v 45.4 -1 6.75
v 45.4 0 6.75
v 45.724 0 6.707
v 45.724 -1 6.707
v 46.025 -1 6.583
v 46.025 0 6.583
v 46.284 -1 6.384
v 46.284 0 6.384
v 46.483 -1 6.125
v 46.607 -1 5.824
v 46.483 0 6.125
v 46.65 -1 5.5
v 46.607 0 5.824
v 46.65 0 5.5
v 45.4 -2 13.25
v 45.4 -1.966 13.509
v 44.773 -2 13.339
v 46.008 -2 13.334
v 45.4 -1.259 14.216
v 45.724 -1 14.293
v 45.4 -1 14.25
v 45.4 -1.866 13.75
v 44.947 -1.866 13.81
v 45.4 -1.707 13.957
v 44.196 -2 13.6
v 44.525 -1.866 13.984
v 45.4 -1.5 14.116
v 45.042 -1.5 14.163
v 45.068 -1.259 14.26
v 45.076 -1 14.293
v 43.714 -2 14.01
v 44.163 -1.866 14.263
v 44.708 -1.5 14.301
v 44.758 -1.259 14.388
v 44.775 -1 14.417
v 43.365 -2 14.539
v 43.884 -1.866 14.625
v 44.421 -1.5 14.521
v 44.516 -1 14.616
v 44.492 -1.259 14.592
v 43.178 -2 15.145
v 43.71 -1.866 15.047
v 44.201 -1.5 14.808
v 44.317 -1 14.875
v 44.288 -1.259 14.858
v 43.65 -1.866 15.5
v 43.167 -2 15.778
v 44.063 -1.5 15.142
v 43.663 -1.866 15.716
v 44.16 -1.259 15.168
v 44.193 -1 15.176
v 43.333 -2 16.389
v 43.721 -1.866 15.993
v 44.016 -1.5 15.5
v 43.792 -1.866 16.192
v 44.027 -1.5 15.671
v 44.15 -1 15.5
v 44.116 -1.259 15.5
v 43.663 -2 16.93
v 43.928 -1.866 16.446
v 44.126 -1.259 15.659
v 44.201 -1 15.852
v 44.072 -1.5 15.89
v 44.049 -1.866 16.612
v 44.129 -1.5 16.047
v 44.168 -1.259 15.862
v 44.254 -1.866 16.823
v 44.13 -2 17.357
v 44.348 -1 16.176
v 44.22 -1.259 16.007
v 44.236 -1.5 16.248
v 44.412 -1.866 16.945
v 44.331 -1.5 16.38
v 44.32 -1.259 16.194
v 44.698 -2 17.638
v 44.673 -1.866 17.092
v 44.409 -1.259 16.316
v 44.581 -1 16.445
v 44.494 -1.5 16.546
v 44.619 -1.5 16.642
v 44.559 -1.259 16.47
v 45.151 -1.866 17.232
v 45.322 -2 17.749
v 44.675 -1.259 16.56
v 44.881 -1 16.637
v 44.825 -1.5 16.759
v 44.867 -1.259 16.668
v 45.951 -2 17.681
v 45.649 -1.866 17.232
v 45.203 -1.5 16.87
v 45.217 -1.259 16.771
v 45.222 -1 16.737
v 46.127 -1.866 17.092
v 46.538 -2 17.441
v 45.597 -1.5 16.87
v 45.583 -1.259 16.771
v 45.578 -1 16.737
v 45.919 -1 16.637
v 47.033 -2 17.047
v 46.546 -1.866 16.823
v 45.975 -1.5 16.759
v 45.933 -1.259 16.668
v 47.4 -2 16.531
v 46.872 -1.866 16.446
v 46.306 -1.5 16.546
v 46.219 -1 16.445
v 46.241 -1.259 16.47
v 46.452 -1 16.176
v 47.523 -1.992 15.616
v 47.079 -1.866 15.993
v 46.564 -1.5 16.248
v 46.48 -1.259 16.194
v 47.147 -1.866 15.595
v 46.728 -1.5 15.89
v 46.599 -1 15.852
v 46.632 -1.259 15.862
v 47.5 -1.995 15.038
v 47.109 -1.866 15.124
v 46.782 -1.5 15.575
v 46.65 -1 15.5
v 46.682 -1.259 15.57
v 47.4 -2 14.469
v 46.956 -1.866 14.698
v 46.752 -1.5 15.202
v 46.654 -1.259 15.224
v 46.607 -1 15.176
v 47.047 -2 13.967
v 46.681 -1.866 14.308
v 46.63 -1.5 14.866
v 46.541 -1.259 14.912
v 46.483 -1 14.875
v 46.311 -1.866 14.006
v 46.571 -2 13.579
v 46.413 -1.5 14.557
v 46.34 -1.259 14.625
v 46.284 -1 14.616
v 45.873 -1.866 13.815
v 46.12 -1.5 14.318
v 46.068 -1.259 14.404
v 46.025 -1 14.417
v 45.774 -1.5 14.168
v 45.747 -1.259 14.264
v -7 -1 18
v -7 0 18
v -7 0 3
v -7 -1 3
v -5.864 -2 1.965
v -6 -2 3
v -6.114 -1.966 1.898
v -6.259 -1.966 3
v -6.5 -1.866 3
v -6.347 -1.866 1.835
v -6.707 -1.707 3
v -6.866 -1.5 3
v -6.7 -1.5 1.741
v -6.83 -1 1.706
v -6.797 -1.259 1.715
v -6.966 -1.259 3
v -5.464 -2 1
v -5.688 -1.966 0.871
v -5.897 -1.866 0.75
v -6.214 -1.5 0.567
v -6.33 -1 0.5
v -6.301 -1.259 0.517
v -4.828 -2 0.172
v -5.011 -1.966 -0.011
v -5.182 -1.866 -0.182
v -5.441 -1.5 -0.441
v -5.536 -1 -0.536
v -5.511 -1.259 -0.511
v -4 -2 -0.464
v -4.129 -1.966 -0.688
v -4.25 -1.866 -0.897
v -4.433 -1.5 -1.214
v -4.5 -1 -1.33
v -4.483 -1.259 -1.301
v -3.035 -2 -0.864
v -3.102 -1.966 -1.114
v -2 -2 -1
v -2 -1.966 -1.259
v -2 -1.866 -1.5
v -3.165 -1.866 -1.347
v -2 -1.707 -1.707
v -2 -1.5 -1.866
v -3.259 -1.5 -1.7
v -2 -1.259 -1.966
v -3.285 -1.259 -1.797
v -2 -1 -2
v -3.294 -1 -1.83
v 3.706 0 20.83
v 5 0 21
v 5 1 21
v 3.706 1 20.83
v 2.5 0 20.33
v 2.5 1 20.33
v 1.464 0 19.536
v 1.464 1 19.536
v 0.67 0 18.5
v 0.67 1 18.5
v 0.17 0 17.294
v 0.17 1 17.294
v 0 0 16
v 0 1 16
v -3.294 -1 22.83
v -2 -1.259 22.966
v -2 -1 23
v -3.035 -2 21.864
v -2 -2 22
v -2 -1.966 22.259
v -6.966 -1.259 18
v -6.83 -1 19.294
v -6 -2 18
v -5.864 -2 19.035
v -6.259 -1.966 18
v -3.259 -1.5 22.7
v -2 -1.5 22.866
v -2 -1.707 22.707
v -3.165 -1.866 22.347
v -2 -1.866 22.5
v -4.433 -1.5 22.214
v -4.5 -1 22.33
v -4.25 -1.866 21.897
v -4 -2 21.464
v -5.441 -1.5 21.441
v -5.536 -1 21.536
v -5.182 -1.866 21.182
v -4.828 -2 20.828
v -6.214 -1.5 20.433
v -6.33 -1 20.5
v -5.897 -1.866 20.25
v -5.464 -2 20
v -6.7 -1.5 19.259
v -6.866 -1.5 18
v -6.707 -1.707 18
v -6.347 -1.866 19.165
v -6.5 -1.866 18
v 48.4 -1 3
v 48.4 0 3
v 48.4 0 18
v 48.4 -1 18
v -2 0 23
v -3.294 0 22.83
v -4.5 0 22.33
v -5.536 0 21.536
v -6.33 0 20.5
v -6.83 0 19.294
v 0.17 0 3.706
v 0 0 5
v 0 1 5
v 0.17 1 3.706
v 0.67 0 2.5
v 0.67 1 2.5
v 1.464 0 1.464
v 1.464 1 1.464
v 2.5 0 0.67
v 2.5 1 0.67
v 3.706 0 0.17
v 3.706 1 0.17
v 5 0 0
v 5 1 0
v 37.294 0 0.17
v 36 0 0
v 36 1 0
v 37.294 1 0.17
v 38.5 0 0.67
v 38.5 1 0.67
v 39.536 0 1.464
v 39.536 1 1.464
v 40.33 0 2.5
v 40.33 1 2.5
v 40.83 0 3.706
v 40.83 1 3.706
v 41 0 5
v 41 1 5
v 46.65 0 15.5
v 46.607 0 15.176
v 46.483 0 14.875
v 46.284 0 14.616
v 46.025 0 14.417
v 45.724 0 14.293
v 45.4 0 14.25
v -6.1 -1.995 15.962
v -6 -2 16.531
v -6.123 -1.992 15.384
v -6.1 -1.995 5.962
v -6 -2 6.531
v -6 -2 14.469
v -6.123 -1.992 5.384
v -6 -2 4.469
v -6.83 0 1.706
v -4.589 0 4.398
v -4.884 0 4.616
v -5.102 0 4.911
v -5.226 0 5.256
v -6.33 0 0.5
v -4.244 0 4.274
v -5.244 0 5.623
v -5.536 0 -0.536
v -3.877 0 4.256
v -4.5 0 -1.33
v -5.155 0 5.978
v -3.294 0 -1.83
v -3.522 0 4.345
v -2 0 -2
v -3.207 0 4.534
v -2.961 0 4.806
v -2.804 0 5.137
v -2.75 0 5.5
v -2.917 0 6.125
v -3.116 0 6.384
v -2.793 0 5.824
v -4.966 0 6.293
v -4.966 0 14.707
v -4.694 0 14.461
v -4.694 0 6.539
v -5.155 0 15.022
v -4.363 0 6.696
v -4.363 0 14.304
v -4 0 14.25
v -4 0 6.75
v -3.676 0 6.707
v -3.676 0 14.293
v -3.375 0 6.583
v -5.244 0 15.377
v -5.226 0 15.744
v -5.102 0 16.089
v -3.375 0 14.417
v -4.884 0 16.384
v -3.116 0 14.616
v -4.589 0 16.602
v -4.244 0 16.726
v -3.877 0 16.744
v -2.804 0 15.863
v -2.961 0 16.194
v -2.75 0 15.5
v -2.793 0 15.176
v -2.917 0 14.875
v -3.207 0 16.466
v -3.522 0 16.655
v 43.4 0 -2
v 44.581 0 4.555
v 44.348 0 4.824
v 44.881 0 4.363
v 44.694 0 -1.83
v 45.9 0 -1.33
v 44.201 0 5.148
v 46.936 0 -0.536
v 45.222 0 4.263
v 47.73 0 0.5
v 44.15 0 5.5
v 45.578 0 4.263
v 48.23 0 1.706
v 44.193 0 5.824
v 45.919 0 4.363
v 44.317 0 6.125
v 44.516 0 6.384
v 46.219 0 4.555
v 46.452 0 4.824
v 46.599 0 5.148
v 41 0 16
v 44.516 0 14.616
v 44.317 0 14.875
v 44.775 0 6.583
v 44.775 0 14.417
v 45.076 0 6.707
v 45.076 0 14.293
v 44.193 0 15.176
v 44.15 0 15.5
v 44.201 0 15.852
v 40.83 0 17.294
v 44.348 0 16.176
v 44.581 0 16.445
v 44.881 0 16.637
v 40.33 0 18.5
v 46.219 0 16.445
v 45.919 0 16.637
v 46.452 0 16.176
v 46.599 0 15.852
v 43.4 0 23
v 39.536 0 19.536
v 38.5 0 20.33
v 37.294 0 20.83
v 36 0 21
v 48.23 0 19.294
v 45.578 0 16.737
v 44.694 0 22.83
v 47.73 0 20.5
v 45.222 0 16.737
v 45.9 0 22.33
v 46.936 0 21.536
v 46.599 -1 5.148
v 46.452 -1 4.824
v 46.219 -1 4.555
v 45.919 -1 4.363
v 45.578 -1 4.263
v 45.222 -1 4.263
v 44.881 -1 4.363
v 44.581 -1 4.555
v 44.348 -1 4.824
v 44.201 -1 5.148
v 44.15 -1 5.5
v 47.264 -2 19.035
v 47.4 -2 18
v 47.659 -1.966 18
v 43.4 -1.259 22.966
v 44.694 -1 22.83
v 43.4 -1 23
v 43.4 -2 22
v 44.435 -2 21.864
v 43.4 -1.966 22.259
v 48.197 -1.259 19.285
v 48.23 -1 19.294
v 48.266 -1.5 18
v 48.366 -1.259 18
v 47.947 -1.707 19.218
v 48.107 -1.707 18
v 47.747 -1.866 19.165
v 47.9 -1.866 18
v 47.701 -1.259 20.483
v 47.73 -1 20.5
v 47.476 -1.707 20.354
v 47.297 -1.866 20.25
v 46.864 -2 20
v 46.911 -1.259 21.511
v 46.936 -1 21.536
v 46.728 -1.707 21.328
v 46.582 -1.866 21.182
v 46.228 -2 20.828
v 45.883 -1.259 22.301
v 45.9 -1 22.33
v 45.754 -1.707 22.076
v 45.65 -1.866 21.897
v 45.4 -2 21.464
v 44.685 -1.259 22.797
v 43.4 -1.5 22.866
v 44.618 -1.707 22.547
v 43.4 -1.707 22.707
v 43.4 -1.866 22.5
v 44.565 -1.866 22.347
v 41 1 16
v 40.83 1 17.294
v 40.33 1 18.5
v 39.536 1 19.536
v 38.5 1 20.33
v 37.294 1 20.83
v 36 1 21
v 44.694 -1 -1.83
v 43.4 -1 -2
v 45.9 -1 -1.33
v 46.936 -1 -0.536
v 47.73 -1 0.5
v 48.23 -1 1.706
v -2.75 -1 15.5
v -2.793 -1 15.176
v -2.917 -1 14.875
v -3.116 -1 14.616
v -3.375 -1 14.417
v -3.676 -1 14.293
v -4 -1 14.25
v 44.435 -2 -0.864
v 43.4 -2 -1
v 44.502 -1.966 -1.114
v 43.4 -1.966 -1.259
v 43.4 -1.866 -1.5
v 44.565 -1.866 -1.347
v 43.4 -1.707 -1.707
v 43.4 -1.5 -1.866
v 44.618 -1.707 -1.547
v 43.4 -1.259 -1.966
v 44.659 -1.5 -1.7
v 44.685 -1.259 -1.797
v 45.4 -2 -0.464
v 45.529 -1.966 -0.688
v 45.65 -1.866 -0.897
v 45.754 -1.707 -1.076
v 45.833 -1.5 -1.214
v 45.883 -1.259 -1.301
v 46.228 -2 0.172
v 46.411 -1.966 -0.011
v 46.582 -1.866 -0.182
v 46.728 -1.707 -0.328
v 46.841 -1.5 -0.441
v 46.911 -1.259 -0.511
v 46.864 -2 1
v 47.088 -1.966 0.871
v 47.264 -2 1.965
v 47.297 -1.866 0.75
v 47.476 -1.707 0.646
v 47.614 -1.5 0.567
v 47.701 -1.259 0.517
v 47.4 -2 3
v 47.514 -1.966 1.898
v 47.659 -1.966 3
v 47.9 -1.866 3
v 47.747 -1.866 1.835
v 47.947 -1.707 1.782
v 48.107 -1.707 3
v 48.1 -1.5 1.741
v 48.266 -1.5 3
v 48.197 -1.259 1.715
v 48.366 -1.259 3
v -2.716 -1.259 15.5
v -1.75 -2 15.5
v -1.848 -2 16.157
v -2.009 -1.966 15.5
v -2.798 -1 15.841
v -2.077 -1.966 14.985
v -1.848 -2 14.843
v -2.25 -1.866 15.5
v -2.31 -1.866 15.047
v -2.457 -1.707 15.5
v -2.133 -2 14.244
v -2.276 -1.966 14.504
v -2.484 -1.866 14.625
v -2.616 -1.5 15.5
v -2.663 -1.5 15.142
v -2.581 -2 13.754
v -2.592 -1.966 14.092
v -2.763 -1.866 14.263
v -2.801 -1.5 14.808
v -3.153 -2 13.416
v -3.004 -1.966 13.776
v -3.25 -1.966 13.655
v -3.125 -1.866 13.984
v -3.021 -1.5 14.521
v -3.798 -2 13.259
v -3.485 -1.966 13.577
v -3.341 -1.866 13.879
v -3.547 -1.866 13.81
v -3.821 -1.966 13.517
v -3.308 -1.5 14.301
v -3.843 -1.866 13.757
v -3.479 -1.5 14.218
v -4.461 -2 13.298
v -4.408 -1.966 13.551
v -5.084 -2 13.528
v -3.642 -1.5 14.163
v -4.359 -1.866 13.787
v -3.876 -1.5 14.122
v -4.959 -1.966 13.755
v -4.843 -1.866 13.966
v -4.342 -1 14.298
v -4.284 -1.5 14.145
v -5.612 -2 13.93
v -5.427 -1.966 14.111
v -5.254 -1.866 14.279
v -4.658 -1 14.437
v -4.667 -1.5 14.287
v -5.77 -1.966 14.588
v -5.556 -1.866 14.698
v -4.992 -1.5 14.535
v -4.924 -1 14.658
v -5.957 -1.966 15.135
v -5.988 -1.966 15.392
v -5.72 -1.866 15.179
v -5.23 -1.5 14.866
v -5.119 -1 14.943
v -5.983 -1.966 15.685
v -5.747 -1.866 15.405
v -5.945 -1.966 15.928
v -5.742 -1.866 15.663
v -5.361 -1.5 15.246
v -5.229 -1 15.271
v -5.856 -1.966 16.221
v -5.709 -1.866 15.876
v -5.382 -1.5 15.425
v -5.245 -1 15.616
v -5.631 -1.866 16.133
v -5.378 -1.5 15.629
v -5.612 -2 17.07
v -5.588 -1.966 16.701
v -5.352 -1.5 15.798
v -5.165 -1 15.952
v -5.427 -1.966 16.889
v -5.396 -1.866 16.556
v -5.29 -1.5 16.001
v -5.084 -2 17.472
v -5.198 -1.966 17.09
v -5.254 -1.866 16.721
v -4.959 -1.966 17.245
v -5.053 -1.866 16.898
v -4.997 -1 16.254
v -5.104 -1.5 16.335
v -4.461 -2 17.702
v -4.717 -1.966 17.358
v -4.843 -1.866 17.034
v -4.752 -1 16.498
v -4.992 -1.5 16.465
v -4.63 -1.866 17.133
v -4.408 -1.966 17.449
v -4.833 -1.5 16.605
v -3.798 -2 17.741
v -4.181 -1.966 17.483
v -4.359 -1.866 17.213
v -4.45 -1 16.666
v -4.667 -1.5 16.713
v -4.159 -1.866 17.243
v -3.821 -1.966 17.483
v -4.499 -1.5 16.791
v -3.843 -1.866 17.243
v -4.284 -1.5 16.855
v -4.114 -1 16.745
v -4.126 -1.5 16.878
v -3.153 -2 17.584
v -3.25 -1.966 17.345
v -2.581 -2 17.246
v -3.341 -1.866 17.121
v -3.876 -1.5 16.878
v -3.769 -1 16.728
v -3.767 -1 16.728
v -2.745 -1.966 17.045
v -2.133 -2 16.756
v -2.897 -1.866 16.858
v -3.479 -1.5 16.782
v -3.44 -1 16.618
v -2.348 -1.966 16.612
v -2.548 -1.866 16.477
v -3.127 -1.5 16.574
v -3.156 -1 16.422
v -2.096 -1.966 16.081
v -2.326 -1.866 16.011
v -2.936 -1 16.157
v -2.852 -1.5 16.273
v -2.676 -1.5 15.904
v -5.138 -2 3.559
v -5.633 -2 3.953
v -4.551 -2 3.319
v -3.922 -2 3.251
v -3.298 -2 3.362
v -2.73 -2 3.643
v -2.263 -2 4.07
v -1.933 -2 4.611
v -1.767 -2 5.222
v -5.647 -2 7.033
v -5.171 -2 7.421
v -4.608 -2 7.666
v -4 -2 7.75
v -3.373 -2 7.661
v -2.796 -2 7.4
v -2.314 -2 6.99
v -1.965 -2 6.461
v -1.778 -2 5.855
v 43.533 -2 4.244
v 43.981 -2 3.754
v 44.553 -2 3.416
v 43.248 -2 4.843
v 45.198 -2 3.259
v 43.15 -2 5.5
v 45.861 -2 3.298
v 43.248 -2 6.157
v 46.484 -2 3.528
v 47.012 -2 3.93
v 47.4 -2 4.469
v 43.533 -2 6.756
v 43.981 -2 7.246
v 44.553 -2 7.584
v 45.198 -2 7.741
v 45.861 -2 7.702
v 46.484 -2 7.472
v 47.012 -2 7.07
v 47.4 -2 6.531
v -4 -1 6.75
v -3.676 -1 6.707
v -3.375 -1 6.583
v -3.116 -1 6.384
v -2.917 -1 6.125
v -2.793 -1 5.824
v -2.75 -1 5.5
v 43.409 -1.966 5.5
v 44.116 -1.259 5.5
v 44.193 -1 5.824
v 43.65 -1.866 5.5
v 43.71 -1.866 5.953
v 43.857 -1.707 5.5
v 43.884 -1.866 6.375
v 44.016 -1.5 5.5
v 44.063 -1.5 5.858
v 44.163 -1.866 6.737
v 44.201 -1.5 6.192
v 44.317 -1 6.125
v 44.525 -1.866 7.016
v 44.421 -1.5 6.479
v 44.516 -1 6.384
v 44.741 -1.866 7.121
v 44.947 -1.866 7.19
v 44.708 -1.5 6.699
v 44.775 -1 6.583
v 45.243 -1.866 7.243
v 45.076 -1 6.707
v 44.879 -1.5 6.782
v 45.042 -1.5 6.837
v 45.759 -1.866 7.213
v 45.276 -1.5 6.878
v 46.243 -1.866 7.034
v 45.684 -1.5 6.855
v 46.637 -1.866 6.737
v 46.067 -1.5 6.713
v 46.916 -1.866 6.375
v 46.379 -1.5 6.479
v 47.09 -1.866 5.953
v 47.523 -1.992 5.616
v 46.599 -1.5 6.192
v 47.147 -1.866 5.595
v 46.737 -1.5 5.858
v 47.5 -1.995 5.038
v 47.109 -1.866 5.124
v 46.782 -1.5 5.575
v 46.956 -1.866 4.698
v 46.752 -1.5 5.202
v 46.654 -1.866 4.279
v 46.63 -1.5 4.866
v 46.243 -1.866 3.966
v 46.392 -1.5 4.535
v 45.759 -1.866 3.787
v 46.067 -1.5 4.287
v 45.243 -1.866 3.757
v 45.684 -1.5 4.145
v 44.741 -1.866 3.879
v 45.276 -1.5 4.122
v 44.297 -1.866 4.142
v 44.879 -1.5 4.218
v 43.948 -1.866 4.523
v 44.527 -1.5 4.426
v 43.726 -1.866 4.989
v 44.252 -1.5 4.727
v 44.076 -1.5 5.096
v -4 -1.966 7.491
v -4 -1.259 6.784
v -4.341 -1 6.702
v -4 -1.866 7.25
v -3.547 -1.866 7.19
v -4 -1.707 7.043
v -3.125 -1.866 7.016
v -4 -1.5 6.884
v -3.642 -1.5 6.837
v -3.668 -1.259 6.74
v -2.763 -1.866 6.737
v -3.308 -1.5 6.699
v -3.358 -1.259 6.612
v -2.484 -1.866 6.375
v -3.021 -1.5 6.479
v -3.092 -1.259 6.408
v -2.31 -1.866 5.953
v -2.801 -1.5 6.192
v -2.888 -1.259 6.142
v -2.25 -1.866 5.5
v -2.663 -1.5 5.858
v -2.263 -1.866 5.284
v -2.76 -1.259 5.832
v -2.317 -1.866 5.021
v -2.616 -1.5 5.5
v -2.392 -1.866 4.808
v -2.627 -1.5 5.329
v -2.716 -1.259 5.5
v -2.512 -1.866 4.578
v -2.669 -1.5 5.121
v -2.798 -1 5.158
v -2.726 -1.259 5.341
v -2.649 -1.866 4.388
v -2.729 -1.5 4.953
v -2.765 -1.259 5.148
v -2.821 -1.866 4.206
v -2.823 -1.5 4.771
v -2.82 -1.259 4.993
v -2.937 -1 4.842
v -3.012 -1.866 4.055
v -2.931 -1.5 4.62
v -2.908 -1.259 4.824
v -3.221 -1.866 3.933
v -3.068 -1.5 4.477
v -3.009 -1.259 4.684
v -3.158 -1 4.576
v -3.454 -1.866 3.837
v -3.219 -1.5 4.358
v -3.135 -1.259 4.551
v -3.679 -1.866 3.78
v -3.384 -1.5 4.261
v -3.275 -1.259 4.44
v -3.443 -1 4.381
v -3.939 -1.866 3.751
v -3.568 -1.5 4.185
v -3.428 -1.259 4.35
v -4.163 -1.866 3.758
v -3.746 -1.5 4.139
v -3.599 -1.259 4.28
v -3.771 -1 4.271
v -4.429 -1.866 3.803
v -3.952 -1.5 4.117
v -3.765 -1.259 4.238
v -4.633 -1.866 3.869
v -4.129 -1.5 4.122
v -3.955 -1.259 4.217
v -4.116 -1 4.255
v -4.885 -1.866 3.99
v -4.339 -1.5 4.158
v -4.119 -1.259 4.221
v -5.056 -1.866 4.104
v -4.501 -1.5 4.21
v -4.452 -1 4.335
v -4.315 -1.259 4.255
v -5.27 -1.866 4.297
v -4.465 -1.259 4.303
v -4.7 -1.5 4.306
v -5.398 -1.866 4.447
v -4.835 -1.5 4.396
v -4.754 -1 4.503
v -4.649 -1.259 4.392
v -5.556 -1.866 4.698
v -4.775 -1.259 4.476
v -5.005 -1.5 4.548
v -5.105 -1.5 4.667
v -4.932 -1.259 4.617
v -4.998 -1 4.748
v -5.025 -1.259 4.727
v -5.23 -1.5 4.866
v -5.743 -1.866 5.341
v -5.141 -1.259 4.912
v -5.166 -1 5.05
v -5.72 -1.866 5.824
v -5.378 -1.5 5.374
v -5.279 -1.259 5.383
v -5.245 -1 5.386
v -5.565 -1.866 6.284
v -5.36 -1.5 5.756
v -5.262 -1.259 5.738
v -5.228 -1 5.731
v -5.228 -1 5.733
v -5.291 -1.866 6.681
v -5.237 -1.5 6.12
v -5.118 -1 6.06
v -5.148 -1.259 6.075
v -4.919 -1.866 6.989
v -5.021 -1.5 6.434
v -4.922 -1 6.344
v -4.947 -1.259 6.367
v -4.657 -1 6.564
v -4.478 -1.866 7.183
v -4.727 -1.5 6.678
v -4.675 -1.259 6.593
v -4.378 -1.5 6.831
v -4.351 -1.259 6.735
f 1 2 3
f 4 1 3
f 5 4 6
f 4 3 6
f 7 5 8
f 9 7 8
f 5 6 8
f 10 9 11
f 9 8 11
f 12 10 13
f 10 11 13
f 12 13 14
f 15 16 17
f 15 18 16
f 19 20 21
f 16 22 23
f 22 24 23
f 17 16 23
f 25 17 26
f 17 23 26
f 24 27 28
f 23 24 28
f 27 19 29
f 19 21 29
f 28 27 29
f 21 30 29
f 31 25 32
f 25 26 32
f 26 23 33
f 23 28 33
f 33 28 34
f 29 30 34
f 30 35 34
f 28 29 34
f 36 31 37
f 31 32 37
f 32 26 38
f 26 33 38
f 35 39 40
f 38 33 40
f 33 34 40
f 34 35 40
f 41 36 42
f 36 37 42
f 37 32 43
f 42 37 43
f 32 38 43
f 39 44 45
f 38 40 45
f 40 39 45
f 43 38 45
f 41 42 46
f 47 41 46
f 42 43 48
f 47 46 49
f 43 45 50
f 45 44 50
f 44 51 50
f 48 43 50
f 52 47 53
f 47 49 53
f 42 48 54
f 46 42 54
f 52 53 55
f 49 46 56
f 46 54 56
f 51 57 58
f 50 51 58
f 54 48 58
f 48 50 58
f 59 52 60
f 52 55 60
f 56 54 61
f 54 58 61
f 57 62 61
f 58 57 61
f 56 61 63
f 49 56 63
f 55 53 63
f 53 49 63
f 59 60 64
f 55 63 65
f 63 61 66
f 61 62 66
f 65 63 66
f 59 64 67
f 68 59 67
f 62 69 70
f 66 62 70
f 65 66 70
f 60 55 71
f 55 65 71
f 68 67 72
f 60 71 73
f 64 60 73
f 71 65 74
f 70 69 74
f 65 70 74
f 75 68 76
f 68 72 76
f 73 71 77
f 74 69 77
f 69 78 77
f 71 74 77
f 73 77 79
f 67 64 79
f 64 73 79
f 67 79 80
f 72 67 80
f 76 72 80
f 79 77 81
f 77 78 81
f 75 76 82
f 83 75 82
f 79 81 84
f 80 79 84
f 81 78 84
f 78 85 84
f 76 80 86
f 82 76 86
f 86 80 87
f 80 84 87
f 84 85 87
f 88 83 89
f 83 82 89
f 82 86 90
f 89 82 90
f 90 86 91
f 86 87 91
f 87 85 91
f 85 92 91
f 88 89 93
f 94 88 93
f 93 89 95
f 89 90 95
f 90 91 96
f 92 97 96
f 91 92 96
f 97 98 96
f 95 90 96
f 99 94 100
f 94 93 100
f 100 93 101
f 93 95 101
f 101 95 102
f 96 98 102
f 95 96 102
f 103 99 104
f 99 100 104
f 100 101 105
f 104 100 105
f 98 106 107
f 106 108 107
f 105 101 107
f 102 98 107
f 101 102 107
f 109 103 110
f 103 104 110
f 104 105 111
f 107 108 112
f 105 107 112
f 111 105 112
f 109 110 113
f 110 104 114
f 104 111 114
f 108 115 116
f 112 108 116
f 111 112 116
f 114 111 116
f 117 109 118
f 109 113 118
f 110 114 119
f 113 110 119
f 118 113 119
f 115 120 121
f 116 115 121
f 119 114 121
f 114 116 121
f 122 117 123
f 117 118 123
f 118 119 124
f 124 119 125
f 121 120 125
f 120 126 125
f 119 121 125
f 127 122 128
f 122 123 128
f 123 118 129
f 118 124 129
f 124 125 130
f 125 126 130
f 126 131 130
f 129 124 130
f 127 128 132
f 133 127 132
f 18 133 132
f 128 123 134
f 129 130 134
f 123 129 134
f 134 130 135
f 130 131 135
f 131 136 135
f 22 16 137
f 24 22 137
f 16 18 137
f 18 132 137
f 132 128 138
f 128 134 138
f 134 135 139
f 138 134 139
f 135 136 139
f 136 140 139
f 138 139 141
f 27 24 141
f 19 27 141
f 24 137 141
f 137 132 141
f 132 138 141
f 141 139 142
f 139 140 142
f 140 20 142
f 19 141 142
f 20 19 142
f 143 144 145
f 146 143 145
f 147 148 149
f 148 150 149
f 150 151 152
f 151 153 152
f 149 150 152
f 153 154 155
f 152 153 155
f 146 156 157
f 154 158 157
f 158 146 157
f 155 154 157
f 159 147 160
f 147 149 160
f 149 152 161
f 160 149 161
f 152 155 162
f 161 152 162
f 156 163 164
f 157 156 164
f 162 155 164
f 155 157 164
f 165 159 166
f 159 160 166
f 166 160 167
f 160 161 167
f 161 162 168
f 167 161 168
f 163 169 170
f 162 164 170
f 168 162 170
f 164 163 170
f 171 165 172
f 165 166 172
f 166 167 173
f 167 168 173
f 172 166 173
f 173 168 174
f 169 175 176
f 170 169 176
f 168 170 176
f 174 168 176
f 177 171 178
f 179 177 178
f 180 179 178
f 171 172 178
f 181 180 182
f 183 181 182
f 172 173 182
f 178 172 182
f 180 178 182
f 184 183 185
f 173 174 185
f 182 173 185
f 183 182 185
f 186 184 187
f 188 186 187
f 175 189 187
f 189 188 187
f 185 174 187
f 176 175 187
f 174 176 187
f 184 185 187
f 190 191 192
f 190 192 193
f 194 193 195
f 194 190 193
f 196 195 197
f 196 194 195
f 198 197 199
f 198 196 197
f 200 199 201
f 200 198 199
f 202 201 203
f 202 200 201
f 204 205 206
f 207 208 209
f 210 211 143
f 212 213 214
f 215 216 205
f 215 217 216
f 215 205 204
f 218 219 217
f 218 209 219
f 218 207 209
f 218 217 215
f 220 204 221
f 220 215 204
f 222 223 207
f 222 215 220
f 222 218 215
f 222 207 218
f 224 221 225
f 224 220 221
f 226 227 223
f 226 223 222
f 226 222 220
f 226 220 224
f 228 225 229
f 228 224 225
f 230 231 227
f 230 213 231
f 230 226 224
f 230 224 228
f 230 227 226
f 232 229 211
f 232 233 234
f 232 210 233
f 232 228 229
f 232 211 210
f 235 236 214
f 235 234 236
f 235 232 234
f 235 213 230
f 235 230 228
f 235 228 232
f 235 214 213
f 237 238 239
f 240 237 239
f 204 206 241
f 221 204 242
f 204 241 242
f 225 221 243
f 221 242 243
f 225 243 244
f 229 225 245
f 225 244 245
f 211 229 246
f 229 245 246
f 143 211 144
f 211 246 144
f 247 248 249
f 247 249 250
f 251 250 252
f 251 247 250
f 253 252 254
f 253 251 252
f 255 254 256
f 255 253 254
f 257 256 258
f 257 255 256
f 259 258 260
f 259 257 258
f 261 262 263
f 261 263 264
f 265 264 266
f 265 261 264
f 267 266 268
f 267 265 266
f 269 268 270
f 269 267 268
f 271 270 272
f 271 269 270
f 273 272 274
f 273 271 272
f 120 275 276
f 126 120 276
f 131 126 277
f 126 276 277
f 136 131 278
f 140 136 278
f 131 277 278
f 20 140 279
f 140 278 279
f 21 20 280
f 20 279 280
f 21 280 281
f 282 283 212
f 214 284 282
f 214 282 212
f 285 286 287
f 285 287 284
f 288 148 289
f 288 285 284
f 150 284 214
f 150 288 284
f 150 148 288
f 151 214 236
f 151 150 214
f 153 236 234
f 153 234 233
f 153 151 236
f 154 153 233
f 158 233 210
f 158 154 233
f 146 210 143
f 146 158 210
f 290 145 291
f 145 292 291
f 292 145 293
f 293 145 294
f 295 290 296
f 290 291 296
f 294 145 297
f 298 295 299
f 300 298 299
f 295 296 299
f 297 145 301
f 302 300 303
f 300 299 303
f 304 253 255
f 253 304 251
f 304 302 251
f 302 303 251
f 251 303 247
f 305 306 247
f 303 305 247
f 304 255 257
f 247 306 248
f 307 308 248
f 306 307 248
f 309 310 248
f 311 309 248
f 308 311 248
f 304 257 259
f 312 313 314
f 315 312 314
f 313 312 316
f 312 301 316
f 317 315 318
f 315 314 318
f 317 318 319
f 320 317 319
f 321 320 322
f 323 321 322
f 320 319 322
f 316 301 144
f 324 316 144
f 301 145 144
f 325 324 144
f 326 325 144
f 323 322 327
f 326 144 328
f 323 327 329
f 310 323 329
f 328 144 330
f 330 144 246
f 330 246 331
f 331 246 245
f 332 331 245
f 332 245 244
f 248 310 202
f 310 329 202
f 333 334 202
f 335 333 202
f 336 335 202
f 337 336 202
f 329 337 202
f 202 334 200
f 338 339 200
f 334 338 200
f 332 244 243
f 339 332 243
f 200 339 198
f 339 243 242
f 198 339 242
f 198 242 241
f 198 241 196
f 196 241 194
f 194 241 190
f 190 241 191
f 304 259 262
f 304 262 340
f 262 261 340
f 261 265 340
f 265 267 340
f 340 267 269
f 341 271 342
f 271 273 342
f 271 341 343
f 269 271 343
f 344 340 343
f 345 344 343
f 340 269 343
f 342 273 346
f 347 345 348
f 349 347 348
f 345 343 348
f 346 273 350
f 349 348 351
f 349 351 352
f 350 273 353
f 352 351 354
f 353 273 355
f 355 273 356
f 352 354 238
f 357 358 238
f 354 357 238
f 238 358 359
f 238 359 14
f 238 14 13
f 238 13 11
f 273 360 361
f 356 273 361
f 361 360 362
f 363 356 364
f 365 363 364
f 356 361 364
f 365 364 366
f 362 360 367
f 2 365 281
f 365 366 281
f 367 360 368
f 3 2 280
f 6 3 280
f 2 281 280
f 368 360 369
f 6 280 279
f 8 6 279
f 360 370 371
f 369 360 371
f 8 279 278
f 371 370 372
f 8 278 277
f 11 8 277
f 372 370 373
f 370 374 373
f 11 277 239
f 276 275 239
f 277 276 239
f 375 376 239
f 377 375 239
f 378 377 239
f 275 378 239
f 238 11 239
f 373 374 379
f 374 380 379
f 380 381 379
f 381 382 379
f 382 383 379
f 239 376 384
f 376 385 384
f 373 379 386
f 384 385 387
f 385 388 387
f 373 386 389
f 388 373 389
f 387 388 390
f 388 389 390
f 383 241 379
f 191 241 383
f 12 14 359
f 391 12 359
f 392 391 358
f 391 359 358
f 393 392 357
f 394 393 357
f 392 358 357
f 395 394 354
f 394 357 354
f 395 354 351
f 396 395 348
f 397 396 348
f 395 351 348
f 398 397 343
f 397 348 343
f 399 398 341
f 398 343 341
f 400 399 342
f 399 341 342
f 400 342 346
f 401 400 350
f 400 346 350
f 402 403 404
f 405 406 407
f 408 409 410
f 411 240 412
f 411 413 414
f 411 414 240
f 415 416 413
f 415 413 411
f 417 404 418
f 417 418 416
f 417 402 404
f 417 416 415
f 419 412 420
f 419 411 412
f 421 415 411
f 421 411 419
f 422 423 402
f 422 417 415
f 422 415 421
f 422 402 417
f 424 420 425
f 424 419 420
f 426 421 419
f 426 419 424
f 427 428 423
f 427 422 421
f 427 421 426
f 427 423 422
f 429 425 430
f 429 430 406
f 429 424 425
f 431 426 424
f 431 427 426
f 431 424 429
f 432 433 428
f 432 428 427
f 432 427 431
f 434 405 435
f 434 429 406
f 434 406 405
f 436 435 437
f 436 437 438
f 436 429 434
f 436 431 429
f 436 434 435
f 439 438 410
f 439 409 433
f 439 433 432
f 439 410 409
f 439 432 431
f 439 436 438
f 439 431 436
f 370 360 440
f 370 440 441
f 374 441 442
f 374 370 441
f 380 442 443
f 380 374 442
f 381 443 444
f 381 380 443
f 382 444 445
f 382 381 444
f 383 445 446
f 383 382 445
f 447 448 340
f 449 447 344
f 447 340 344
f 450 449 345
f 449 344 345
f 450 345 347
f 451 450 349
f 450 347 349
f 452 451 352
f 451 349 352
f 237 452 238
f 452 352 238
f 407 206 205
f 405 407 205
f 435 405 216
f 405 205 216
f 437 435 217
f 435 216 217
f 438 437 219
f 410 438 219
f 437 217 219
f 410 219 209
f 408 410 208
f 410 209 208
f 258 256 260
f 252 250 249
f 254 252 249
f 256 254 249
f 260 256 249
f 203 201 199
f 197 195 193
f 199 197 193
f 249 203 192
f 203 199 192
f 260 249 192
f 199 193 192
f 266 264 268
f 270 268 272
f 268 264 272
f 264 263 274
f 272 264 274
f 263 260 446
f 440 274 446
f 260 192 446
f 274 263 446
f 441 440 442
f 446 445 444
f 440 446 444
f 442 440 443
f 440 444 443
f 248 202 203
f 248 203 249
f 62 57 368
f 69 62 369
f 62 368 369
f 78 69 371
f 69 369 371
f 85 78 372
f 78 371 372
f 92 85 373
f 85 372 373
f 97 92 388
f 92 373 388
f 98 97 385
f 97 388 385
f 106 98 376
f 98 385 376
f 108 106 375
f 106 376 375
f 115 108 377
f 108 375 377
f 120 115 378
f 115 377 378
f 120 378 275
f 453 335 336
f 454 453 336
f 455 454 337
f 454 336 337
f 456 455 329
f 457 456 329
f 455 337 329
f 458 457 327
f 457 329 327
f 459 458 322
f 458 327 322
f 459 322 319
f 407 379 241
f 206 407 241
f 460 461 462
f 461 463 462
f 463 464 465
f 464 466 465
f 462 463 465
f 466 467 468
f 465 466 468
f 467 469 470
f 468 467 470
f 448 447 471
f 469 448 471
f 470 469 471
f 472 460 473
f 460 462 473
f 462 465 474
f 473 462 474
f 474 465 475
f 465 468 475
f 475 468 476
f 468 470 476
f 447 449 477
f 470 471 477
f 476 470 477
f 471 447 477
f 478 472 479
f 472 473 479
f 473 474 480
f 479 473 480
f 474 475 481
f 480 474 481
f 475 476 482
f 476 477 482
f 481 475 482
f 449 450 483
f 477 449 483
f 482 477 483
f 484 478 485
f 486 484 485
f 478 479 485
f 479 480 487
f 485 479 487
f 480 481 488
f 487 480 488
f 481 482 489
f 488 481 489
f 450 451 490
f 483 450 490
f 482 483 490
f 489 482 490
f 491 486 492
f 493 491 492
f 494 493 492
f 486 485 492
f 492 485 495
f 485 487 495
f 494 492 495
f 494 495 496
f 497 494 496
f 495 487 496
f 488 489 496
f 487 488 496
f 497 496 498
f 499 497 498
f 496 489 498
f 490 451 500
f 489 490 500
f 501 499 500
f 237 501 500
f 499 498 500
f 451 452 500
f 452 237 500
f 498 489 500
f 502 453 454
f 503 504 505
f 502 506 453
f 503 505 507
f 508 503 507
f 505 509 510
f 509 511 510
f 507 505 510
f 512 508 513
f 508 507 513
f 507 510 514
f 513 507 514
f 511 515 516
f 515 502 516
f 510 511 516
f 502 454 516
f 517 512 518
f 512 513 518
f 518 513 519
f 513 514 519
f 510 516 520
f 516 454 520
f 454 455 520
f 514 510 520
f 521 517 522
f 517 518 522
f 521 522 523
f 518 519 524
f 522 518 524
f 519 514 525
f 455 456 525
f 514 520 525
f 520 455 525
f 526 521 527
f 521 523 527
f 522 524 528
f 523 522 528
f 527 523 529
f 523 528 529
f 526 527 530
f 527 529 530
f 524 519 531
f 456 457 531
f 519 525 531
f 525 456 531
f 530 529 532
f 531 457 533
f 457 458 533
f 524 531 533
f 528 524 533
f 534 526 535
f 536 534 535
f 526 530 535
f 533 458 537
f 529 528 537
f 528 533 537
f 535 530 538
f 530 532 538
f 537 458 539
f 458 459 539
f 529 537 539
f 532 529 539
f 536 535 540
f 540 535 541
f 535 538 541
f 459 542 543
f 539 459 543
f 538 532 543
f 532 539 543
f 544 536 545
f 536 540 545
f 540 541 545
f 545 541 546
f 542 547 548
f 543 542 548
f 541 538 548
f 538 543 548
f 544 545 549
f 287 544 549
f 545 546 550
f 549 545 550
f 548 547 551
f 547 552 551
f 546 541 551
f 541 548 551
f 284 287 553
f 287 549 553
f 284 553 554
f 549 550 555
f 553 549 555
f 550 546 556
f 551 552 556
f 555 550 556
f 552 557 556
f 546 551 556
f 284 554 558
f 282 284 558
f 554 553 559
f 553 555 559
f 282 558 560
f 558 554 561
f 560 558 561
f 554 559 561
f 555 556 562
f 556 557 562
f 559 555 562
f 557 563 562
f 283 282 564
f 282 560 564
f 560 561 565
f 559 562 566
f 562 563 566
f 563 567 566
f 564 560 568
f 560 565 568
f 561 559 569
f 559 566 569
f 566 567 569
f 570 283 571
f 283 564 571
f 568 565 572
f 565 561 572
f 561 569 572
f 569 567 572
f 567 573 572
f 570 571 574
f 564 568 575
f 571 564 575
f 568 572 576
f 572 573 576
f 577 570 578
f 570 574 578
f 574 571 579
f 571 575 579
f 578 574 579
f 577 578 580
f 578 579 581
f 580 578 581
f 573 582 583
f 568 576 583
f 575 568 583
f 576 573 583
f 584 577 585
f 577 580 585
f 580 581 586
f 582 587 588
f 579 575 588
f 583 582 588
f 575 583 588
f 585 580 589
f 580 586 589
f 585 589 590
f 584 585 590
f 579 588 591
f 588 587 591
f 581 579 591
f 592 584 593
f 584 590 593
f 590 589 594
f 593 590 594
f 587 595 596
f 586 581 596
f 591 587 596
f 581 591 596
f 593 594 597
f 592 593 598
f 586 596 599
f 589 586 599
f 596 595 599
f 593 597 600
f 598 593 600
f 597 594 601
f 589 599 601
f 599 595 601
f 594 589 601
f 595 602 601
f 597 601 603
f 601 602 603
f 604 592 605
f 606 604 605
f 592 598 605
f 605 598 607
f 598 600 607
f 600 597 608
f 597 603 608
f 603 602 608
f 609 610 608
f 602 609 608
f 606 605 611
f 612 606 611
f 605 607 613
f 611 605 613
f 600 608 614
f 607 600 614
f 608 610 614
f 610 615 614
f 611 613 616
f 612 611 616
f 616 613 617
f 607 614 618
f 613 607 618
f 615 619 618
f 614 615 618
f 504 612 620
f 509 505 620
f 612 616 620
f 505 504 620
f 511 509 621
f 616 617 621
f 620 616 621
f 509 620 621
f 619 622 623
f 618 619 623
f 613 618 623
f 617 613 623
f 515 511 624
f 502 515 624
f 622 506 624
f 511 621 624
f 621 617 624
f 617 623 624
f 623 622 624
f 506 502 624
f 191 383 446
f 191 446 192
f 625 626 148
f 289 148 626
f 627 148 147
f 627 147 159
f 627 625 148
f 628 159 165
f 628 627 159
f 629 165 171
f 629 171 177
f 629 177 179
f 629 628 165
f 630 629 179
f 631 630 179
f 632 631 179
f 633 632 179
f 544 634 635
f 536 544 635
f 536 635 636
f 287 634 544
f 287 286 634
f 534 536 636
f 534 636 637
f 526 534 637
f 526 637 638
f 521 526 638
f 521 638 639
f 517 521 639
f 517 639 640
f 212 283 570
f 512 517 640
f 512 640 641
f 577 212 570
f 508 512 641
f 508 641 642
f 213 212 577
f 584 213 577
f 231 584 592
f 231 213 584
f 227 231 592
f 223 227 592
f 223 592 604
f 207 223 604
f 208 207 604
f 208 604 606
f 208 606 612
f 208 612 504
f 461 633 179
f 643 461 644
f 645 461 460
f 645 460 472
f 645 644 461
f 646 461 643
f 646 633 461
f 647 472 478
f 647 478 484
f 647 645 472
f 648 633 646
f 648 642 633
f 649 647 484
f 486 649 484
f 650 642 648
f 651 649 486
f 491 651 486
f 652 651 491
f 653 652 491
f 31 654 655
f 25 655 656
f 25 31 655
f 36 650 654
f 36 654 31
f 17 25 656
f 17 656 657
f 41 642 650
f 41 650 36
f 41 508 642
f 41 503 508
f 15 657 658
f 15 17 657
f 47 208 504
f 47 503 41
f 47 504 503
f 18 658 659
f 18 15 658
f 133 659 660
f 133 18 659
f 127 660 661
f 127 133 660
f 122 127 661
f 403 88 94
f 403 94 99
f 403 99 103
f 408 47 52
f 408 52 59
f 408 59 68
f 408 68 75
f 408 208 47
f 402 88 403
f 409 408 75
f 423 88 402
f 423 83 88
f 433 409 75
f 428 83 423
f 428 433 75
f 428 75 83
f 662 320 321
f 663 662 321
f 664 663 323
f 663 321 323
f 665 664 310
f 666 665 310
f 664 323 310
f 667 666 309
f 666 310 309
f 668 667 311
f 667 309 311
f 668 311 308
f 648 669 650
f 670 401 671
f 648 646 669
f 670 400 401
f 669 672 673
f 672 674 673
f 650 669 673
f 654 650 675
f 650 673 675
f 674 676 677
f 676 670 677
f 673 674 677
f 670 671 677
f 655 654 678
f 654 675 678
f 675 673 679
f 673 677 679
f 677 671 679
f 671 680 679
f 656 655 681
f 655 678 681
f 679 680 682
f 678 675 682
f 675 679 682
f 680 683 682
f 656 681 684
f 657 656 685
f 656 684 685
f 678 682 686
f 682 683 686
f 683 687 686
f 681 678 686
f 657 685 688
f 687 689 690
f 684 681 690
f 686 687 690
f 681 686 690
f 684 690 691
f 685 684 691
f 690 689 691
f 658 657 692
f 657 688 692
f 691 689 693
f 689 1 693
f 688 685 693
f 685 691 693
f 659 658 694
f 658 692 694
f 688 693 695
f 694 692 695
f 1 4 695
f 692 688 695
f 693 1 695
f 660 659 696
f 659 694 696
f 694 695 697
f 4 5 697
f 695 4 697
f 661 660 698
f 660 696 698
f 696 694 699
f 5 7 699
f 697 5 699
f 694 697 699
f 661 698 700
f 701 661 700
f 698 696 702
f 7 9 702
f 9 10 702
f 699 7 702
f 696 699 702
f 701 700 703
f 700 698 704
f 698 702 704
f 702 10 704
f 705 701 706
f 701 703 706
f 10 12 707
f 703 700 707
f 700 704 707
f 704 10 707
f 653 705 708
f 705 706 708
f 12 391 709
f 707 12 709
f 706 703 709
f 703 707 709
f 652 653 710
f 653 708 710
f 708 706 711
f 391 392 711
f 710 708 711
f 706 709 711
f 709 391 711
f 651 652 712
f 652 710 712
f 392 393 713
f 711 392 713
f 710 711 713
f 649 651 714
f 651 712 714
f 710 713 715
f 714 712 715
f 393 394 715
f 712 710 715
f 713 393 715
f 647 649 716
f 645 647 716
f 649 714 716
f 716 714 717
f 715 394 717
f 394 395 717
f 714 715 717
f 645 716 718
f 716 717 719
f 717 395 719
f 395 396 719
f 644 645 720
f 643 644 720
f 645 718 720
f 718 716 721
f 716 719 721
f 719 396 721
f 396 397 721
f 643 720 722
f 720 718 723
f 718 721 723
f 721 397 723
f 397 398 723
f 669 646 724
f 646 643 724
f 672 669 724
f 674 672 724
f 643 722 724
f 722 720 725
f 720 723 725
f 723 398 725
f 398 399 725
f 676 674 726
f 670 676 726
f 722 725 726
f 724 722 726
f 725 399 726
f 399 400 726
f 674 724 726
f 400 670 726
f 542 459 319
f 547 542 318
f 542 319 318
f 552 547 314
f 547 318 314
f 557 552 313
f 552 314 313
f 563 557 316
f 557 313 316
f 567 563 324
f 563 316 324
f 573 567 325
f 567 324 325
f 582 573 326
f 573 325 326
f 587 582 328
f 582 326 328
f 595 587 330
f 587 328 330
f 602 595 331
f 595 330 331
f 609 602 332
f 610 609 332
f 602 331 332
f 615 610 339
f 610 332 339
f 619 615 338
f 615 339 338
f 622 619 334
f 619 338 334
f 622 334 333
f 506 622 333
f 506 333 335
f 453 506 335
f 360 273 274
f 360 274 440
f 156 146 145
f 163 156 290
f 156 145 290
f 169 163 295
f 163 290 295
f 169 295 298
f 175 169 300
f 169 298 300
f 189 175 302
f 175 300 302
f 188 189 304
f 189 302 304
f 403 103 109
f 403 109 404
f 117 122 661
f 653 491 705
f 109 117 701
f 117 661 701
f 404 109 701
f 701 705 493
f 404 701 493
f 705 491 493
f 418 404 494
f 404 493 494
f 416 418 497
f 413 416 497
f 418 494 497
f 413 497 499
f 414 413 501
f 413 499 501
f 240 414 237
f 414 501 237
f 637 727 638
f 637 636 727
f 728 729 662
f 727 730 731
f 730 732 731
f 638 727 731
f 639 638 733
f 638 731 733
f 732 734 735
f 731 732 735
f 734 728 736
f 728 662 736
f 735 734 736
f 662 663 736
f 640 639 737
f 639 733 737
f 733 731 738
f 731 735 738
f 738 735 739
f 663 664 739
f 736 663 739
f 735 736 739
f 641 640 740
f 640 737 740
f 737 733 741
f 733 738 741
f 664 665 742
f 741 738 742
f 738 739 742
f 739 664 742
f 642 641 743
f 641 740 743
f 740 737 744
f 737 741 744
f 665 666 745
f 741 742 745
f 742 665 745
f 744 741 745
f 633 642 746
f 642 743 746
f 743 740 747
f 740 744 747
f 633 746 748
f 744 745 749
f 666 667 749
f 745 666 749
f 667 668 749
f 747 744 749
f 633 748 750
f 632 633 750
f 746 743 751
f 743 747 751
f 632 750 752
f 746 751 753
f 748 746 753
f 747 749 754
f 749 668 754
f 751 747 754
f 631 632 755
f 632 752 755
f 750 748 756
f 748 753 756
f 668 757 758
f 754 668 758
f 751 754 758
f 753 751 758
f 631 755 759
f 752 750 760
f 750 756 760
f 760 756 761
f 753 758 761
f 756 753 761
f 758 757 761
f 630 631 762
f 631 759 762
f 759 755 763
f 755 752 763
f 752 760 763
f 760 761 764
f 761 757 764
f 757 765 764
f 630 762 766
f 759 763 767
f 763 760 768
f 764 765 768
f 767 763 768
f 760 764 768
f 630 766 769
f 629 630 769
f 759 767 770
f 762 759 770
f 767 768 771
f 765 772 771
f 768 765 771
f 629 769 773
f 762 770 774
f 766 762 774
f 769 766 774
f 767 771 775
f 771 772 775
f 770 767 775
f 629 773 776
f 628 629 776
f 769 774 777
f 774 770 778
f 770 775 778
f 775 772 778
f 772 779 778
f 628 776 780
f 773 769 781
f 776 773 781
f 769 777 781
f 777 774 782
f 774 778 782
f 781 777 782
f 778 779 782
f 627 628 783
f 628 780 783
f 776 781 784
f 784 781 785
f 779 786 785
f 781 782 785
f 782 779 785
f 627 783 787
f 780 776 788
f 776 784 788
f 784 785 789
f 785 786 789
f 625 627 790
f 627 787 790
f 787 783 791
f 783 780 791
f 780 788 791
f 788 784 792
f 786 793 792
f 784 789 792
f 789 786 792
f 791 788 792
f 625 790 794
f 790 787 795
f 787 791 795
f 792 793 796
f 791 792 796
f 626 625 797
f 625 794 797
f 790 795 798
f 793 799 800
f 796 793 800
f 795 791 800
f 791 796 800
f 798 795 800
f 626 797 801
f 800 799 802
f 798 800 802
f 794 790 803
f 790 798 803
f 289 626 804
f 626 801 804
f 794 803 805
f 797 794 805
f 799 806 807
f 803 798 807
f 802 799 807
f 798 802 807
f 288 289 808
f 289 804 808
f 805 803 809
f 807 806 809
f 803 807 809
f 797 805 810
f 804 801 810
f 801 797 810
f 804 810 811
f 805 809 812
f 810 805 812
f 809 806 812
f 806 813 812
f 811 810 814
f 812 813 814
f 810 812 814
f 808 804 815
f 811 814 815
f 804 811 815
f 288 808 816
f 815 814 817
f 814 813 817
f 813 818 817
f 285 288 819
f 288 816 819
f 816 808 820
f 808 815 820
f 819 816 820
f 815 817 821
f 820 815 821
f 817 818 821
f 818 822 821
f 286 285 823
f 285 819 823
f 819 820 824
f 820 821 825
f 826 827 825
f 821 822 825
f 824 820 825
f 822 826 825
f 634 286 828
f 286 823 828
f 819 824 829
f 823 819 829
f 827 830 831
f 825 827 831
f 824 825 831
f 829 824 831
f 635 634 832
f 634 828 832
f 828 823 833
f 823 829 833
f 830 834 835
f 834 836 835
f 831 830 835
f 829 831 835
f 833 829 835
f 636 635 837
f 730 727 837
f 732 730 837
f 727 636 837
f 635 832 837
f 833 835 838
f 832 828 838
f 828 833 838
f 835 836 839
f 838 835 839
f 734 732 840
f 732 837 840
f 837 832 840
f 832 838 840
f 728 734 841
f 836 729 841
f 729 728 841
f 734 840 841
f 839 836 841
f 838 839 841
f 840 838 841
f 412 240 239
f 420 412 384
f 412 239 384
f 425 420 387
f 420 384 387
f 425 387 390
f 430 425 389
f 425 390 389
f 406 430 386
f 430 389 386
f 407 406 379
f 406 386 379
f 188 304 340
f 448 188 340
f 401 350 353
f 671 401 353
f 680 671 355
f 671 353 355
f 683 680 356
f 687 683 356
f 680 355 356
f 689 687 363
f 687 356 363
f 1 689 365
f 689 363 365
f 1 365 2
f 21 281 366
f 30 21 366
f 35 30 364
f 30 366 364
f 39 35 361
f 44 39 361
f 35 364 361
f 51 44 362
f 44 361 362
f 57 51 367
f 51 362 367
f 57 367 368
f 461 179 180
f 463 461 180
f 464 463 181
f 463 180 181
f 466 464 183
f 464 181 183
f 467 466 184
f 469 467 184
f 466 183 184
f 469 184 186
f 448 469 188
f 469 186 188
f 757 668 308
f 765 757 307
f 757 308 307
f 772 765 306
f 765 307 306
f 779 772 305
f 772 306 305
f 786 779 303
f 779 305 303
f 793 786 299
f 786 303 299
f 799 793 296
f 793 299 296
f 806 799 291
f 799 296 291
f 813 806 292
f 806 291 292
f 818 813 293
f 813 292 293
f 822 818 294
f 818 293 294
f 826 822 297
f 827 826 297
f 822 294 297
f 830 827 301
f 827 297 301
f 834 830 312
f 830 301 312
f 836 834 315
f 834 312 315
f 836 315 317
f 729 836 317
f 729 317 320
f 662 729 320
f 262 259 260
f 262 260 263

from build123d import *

# Parameters (mm, degrees)
F0_W         = 41
F0_H         = 10
F1_DEPTH     = 2
F2_DEPTH     = 1
F3_T1_DEPTH  = 45.4
F3_T3_DEPTH  = 15
F3_T6_ANGLE  = 90
F3_T8_ANGLE  = 90
F3_T10_ANGLE = 90
F3_T12_ANGLE = 90


# Not quite as in the source:
# - a fillet or chamfer that OpenCascade refuses, or shapes differently, is made with other operations: its cross-section is extruded or revolved along the edge and cut away or added


with BuildPart() as f1:
    # F0 (on Front) → F1 (new body)
    with BuildSketch(Plane.XZ):
        with BuildLine():
            Line((43.4, 23), (-2, 23))
            ThreePointArc((-2, 23), (-5.5355339059, 21.5355339059), (-7, 18))
            Line((-7, 18), (-7, 3))
            ThreePointArc((-7, 3), (-5.5355339059, -0.5355339059), (-2, -2))
            Line((-2, -2), (43.4, -2))
            ThreePointArc((43.4, -2), (46.9355339059, -0.5355339059), (48.4, 3))
            Line((48.4, 3), (48.4, 18))
            ThreePointArc((48.4, 18), (46.9355339059, 21.5355339059), (43.4, 23))
        make_face()
        with BuildLine():
            Line((36, 0), (5, 0))
            ThreePointArc((5, 0), (1.4644660941, 1.4644660941), (0, 5))
            Line((0, 5), (0, 5.5))
            Line((0, 5.5), (-2.75, 5.5))
            ThreePointArc((-2.75, 5.5), (-4.8838834765, 4.6161165235), (-4, 6.75))
            Line((-4, 6.75), (-4, 14.25))
            ThreePointArc((-4, 14.25), (-4.8838834765, 16.3838834765), (-2.75, 15.5))
            Line((-2.75, 15.5), (0, 15.5))
            Line((0, 15.5), (0, 16))
            ThreePointArc((0, 16), (1.4644660941, 19.5355339059), (5, 21))
            Line((5, 21), (36, 21))
            ThreePointArc((36, 21), (39.5355339059, 19.5355339059), (41, 16))
            Line((41, 16), (41, 15.5))
            Line((41, 15.5), (44.15, 15.5))
            ThreePointArc((44.15, 15.5), (45.4, 16.75), (46.65, 15.5))
            ThreePointArc((46.65, 15.5), (46.2838834765, 14.6161165235), (45.4, 14.25))
            Line((45.4, 14.25), (45.4, 6.75))
            ThreePointArc((45.4, 6.75), (46.2838834765, 6.3838834765), (46.65, 5.5))
            ThreePointArc((46.65, 5.5), (45.4, 4.25), (44.15, 5.5))
            Line((44.15, 5.5), (41, 5.5))
            Line((41, 5.5), (41, 5))
            ThreePointArc((41, 5), (39.5355339059, 1.4644660941), (36, 0))
        make_face(mode=Mode.SUBTRACT)
        with BuildLine():
            Line((0, 16), (0, 15.5))
            Line((0, 15.5), (41, 15.5))
            Line((41, 15.5), (41, 16))
            ThreePointArc((41, 16), (39.5355339059, 19.5355339059), (36, 21))
            Line((36, 21), (5, 21))
            ThreePointArc((5, 21), (1.4644660941, 19.5355339059), (0, 16))
        make_face()
        with BuildLine():
            Line((-2.75, 5.5), (0, 5.5))
            Line((0, 5.5), (0, 15.5))
            Line((0, 15.5), (-2.75, 15.5))
            ThreePointArc((-2.75, 15.5), (-3.1161165235, 14.6161165235), (-4, 14.25))
            Line((-4, 14.25), (-4, 6.75))
            ThreePointArc((-4, 6.75), (-3.1161165235, 6.3838834765), (-2.75, 5.5))
        make_face()
        with Locations((20.5, 10.5)):
            Rectangle(F0_W, F0_H)
        with BuildLine():
            Line((41, 15.5), (41, 5.5))
            Line((41, 5.5), (44.15, 5.5))
            ThreePointArc((44.15, 5.5), (44.5161165235, 6.3838834765), (45.4, 6.75))
            Line((45.4, 6.75), (45.4, 14.25))
            ThreePointArc((45.4, 14.25), (44.5161165235, 14.6161165235), (44.15, 15.5))
            Line((44.15, 15.5), (41, 15.5))
        make_face()
        with BuildLine():
            ThreePointArc((0, 5), (1.4644660941, 1.4644660941), (5, 0))
            Line((5, 0), (36, 0))
            ThreePointArc((36, 0), (39.5355339059, 1.4644660941), (41, 5))
            Line((41, 5), (41, 5.5))
            Line((41, 5.5), (0, 5.5))
            Line((0, 5.5), (0, 5))
        make_face()
    extrude(amount=F1_DEPTH)

    # F0 (on Front) → F2 (join)
    with BuildSketch(Plane.XZ):
        with BuildLine():
            Line((0, 16), (0, 15.5))
            Line((0, 15.5), (41, 15.5))
            Line((41, 15.5), (41, 16))
            ThreePointArc((41, 16), (39.5355339059, 19.5355339059), (36, 21))
            Line((36, 21), (5, 21))
            ThreePointArc((5, 21), (1.4644660941, 19.5355339059), (0, 16))
        make_face()
        with Locations((20.5, 10.5)):
            Rectangle(F0_W, F0_H)
        with BuildLine():
            ThreePointArc((0, 5), (1.4644660941, 1.4644660941), (5, 0))
            Line((5, 0), (36, 0))
            ThreePointArc((36, 0), (39.5355339059, 1.4644660941), (41, 5))
            Line((41, 5), (41, 5.5))
            Line((41, 5.5), (0, 5.5))
            Line((0, 5.5), (0, 5))
        make_face()
    extrude(amount=-F2_DEPTH)

    # F3: fillet of radius 1 on 12 edges, made by hand

    # F3_s2 → F3_t1 (cut)
    with BuildSketch(Plane.YZ.offset(-2)):
        with BuildLine():
            ThreePointArc((-1, 23), (-1.7071067812, 22.7071067812), (-2, 22))
            Line((-2, 22), (-2, 23))
            Line((-2, 23), (-1, 23))
        make_face()
        with BuildLine():
            ThreePointArc((-2, -1), (-1.7071067812, -1.7071067812), (-1, -2))
            Line((-1, -2), (-2, -2))
            Line((-2, -2), (-2, -1))
        make_face()
    extrude(amount=F3_T1_DEPTH, mode=Mode.SUBTRACT)

    # F3_s4 → F3_t3 (cut)
    with BuildSketch(Plane.XY.offset(3)):
        with BuildLine():
            ThreePointArc((-6, -2), (-6.7071067812, -1.7071067812), (-7, -1))
            Line((-7, -1), (-7, -2))
            Line((-7, -2), (-6, -2))
        make_face()
        with BuildLine():
            ThreePointArc((47.4, -2), (48.1071067812, -1.7071067812), (48.4, -1))
            Line((48.4, -1), (48.4, -2))
            Line((48.4, -2), (47.4, -2))
        make_face()
    extrude(amount=F3_T3_DEPTH, mode=Mode.SUBTRACT)

    # F3_s5 → F3_t6 (revolve, cut)
    with BuildSketch(Plane.YZ.offset(-2)):
        with BuildLine():
            ThreePointArc((-1, 23), (-1.7071067812, 22.7071067812), (-2, 22))
            Line((-2, 22), (-2, 23))
            Line((-2, 23), (-1, 23))
        make_face()
    revolve(axis=Axis((-2, -2, 18), (0, -1, 0)), revolution_arc=F3_T6_ANGLE, mode=Mode.SUBTRACT)

    # F3_s7 → F3_t8 (revolve, cut)
    with BuildSketch(Plane.XY.offset(3)):
        with BuildLine():
            ThreePointArc((-6, -2), (-6.7071067812, -1.7071067812), (-7, -1))
            Line((-7, -1), (-7, -2))
            Line((-7, -2), (-6, -2))
        make_face()
    revolve(axis=Axis((-2, -2, 3), (0, -1, 0)), revolution_arc=F3_T8_ANGLE, mode=Mode.SUBTRACT)

    # F3_s9 → F3_t10 (revolve, cut)
    with BuildSketch(Plane.YZ.offset(43.4)):
        with BuildLine():
            ThreePointArc((-2, -1), (-1.7071067812, -1.7071067812), (-1, -2))
            Line((-1, -2), (-2, -2))
            Line((-2, -2), (-2, -1))
        make_face()
    revolve(axis=Axis((43.4, -2, 3), (0, -1, 0)), revolution_arc=F3_T10_ANGLE, mode=Mode.SUBTRACT)

    # F3_s11 → F3_t12 (revolve, cut)
    with BuildSketch(Plane.XY.offset(18)):
        with BuildLine():
            ThreePointArc((48.4, -1), (48.1071067812, -1.7071067812), (47.4, -2))
            Line((47.4, -2), (48.4, -2))
            Line((48.4, -2), (48.4, -1))
        make_face()
    revolve(axis=Axis((43.4, -2, 18), (0, -1, 0)), revolution_arc=F3_T12_ANGLE, mode=Mode.SUBTRACT)

    # F3_s13 → F3_t14 (revolve, cut)
    with BuildSketch(Plane.YZ.offset(-4)):
        with BuildLine():
            ThreePointArc((-2, 7.75), (-1.7071067812, 7.0428932188), (-1, 6.75))
            Line((-1, 6.75), (-2, 6.75))
            Line((-2, 6.75), (-2, 7.75))
        make_face()
    revolve(axis=Axis((-4, -2, 5.5), (0, 1, 0)), mode=Mode.SUBTRACT)

    # F3_s15 → F3_t16 (revolve, cut)
    with BuildSketch(Plane.XY.offset(15.5)):
        with BuildLine():
            ThreePointArc((-1.75, -2), (-2.4571067812, -1.7071067812), (-2.75, -1))
            Line((-2.75, -1), (-2.75, -2))
            Line((-2.75, -2), (-1.75, -2))
        make_face()
    revolve(axis=Axis((-4, -2, 15.5), (0, 1, 0)), mode=Mode.SUBTRACT)

    # F3_s17 → F3_t18 (revolve, cut)
    with BuildSketch(Plane.XY.offset(5.5)):
        with BuildLine():
            ThreePointArc((43.15, -2), (43.8571067812, -1.7071067812), (44.15, -1))
            Line((44.15, -1), (44.15, -2))
            Line((44.15, -2), (43.15, -2))
        make_face()
    revolve(axis=Axis((45.4, -2, 5.5), (0, 1, 0)), mode=Mode.SUBTRACT)

    # F3_s19 → F3_t20 (revolve, cut)
    with BuildSketch(Plane.YZ.offset(45.4)):
        with BuildLine():
            ThreePointArc((-2, 13.25), (-1.7071067812, 13.9571067812), (-1, 14.25))
            Line((-1, 14.25), (-2, 14.25))
            Line((-2, 14.25), (-2, 13.25))
        make_face()
    revolve(axis=Axis((45.4, -2, 15.5), (0, 1, 0)), mode=Mode.SUBTRACT)


solid = f1.part
